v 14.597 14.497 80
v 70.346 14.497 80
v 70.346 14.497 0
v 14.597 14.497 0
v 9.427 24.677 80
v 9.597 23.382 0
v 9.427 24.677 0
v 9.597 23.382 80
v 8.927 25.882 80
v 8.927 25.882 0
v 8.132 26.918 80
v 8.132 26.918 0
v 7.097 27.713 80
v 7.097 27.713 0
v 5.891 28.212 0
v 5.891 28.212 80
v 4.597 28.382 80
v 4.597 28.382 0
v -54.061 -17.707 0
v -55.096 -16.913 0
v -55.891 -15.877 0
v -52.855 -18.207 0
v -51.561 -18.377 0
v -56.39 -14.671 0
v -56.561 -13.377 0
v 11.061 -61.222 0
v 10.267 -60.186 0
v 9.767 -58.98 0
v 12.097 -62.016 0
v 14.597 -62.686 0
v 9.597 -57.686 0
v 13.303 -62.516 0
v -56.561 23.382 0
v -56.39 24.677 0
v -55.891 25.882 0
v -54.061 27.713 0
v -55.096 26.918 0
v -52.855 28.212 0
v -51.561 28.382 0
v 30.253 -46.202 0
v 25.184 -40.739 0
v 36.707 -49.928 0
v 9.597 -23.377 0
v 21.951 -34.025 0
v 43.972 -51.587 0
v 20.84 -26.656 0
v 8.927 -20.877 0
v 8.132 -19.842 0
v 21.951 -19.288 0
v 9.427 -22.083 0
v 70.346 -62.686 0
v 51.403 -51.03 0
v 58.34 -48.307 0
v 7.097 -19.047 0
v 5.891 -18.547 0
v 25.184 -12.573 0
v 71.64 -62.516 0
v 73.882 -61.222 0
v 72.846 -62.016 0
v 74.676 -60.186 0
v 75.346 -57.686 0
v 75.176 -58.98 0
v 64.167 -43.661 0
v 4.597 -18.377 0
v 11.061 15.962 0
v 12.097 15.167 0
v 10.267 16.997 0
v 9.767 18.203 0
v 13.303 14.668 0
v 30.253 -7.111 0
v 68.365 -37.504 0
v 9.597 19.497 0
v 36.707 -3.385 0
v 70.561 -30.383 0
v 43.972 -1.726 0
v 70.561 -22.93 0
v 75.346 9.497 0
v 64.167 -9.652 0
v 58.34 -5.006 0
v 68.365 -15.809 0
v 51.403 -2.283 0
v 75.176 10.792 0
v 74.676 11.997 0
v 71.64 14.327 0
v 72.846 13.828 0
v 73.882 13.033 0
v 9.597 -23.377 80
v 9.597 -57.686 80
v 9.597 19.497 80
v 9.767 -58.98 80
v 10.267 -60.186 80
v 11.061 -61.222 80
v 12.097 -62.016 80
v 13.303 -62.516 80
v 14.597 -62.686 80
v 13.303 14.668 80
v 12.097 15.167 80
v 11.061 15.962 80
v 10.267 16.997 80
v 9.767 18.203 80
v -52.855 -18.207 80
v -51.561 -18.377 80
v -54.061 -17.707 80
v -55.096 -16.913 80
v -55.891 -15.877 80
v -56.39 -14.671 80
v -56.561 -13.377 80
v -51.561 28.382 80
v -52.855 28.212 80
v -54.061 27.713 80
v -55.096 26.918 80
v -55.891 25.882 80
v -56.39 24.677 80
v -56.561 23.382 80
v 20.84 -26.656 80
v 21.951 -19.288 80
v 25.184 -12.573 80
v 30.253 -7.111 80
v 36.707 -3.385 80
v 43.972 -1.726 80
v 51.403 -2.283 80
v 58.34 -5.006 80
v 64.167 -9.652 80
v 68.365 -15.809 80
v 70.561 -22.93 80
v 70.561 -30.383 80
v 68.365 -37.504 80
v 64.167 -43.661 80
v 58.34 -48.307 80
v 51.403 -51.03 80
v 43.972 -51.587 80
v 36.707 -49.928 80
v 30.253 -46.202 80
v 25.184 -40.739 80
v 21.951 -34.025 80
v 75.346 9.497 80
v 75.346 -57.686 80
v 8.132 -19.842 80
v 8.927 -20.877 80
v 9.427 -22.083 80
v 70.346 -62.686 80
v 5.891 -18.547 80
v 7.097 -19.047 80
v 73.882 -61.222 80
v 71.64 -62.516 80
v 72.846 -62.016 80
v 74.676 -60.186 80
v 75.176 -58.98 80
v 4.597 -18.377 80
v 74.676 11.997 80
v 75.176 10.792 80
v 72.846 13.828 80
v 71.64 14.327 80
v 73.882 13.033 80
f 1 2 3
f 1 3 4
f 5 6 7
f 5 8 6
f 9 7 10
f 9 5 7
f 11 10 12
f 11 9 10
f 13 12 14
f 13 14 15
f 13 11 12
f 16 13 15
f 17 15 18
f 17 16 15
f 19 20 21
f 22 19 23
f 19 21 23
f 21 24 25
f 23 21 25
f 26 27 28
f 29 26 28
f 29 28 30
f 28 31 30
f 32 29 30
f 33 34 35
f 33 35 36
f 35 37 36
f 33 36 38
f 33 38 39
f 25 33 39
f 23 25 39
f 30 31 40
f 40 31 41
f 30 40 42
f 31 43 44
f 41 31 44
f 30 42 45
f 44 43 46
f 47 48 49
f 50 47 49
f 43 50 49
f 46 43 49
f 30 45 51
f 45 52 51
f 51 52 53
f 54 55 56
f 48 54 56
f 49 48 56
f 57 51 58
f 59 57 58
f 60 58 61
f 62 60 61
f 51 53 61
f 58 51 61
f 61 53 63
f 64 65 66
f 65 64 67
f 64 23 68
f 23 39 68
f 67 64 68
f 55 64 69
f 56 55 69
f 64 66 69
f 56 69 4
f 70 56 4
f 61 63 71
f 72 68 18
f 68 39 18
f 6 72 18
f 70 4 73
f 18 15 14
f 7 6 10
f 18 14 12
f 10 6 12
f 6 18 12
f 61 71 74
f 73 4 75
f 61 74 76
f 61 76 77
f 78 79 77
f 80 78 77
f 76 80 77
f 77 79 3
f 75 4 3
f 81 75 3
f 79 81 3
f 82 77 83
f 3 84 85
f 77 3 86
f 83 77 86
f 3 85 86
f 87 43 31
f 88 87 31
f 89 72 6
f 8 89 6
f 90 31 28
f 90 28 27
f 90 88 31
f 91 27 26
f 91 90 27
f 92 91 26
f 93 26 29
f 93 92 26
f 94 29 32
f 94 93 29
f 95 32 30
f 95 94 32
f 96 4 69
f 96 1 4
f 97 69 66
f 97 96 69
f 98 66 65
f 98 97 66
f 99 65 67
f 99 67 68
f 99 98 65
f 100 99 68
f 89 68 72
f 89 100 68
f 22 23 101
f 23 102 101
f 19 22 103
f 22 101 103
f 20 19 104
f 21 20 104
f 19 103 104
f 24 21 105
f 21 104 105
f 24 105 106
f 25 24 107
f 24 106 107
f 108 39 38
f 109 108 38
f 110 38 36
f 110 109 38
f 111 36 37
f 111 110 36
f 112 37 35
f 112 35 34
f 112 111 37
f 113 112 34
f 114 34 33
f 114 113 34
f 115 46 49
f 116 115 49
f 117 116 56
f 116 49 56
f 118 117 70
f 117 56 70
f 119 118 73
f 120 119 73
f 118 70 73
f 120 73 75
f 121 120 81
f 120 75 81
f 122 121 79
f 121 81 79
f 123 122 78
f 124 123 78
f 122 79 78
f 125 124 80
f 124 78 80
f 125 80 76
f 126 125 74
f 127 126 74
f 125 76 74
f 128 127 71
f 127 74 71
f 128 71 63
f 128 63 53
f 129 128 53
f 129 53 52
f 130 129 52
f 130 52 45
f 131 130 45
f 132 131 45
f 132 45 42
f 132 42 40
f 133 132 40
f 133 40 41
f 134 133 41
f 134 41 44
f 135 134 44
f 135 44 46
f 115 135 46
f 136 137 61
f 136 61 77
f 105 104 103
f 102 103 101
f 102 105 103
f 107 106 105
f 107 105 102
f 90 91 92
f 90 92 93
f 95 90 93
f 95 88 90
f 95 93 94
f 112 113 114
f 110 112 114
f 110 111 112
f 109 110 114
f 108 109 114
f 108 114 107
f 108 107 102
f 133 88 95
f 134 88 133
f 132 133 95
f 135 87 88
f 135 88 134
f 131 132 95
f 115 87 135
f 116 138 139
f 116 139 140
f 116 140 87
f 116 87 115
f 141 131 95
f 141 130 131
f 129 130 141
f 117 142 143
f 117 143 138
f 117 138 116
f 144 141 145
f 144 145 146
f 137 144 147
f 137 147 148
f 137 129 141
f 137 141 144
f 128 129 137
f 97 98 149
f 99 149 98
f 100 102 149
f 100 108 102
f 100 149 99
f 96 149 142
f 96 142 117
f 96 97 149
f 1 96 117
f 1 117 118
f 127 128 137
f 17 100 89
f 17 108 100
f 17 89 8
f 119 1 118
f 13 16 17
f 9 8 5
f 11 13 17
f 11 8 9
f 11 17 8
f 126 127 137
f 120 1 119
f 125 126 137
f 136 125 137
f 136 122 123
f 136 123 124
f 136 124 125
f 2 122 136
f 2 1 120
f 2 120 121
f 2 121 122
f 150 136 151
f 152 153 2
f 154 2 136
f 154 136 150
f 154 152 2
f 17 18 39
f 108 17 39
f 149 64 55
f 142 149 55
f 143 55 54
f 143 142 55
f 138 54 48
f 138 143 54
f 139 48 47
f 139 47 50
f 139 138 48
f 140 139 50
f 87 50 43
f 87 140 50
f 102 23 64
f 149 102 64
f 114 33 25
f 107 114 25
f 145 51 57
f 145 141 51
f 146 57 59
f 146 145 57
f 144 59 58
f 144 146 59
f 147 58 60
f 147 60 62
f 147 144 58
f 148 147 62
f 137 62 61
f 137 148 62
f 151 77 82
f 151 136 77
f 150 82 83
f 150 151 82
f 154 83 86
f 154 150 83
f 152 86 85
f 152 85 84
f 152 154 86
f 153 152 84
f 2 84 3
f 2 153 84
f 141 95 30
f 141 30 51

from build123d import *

# Parameters (mm, degrees)
F1_DEPTH = 80
F2_R     = 5
F4_D     = 50


with BuildPart() as f1:
    # F0 (on Top) → F1 (new body)
    with BuildSketch(Plane.XY):
        Polygon((-56.56068, -18.37711), (9.596914, -18.37711), (9.596914, 14.497496), (9.596914, 28.382421), (-56.56068, 28.382421), align=None)
        Polygon((9.596914, 14.497496), (9.596914, -18.37711), (9.596914, -62.686369), (75.346142, -62.686369), (75.346142, 14.497496), align=None)
    extrude(amount=F1_DEPTH)

    # F2
    f2_edges = [f1.edges().sort_by_distance(p)[0] for p in [
        (9.596914, 14.497496, 40),
        (9.596914, -18.37711, 40),
        (-56.56068, -18.37711, 40),
        (-56.56068, 28.382421, 40),
        (9.596914, 28.382421, 40),
        (75.346142, 14.497496, 40),
        (75.346142, -62.686369, 40),
        (9.596914, -62.686369, 40),
    ]]
    fillet(f2_edges, radius=F2_R)

    # F4 (through all)
    with Locations(Plane.XY.offset(80)):
        with Locations((45.840353, -26.656464)):
            Hole(F4_D / 2)


solid = f1.part
